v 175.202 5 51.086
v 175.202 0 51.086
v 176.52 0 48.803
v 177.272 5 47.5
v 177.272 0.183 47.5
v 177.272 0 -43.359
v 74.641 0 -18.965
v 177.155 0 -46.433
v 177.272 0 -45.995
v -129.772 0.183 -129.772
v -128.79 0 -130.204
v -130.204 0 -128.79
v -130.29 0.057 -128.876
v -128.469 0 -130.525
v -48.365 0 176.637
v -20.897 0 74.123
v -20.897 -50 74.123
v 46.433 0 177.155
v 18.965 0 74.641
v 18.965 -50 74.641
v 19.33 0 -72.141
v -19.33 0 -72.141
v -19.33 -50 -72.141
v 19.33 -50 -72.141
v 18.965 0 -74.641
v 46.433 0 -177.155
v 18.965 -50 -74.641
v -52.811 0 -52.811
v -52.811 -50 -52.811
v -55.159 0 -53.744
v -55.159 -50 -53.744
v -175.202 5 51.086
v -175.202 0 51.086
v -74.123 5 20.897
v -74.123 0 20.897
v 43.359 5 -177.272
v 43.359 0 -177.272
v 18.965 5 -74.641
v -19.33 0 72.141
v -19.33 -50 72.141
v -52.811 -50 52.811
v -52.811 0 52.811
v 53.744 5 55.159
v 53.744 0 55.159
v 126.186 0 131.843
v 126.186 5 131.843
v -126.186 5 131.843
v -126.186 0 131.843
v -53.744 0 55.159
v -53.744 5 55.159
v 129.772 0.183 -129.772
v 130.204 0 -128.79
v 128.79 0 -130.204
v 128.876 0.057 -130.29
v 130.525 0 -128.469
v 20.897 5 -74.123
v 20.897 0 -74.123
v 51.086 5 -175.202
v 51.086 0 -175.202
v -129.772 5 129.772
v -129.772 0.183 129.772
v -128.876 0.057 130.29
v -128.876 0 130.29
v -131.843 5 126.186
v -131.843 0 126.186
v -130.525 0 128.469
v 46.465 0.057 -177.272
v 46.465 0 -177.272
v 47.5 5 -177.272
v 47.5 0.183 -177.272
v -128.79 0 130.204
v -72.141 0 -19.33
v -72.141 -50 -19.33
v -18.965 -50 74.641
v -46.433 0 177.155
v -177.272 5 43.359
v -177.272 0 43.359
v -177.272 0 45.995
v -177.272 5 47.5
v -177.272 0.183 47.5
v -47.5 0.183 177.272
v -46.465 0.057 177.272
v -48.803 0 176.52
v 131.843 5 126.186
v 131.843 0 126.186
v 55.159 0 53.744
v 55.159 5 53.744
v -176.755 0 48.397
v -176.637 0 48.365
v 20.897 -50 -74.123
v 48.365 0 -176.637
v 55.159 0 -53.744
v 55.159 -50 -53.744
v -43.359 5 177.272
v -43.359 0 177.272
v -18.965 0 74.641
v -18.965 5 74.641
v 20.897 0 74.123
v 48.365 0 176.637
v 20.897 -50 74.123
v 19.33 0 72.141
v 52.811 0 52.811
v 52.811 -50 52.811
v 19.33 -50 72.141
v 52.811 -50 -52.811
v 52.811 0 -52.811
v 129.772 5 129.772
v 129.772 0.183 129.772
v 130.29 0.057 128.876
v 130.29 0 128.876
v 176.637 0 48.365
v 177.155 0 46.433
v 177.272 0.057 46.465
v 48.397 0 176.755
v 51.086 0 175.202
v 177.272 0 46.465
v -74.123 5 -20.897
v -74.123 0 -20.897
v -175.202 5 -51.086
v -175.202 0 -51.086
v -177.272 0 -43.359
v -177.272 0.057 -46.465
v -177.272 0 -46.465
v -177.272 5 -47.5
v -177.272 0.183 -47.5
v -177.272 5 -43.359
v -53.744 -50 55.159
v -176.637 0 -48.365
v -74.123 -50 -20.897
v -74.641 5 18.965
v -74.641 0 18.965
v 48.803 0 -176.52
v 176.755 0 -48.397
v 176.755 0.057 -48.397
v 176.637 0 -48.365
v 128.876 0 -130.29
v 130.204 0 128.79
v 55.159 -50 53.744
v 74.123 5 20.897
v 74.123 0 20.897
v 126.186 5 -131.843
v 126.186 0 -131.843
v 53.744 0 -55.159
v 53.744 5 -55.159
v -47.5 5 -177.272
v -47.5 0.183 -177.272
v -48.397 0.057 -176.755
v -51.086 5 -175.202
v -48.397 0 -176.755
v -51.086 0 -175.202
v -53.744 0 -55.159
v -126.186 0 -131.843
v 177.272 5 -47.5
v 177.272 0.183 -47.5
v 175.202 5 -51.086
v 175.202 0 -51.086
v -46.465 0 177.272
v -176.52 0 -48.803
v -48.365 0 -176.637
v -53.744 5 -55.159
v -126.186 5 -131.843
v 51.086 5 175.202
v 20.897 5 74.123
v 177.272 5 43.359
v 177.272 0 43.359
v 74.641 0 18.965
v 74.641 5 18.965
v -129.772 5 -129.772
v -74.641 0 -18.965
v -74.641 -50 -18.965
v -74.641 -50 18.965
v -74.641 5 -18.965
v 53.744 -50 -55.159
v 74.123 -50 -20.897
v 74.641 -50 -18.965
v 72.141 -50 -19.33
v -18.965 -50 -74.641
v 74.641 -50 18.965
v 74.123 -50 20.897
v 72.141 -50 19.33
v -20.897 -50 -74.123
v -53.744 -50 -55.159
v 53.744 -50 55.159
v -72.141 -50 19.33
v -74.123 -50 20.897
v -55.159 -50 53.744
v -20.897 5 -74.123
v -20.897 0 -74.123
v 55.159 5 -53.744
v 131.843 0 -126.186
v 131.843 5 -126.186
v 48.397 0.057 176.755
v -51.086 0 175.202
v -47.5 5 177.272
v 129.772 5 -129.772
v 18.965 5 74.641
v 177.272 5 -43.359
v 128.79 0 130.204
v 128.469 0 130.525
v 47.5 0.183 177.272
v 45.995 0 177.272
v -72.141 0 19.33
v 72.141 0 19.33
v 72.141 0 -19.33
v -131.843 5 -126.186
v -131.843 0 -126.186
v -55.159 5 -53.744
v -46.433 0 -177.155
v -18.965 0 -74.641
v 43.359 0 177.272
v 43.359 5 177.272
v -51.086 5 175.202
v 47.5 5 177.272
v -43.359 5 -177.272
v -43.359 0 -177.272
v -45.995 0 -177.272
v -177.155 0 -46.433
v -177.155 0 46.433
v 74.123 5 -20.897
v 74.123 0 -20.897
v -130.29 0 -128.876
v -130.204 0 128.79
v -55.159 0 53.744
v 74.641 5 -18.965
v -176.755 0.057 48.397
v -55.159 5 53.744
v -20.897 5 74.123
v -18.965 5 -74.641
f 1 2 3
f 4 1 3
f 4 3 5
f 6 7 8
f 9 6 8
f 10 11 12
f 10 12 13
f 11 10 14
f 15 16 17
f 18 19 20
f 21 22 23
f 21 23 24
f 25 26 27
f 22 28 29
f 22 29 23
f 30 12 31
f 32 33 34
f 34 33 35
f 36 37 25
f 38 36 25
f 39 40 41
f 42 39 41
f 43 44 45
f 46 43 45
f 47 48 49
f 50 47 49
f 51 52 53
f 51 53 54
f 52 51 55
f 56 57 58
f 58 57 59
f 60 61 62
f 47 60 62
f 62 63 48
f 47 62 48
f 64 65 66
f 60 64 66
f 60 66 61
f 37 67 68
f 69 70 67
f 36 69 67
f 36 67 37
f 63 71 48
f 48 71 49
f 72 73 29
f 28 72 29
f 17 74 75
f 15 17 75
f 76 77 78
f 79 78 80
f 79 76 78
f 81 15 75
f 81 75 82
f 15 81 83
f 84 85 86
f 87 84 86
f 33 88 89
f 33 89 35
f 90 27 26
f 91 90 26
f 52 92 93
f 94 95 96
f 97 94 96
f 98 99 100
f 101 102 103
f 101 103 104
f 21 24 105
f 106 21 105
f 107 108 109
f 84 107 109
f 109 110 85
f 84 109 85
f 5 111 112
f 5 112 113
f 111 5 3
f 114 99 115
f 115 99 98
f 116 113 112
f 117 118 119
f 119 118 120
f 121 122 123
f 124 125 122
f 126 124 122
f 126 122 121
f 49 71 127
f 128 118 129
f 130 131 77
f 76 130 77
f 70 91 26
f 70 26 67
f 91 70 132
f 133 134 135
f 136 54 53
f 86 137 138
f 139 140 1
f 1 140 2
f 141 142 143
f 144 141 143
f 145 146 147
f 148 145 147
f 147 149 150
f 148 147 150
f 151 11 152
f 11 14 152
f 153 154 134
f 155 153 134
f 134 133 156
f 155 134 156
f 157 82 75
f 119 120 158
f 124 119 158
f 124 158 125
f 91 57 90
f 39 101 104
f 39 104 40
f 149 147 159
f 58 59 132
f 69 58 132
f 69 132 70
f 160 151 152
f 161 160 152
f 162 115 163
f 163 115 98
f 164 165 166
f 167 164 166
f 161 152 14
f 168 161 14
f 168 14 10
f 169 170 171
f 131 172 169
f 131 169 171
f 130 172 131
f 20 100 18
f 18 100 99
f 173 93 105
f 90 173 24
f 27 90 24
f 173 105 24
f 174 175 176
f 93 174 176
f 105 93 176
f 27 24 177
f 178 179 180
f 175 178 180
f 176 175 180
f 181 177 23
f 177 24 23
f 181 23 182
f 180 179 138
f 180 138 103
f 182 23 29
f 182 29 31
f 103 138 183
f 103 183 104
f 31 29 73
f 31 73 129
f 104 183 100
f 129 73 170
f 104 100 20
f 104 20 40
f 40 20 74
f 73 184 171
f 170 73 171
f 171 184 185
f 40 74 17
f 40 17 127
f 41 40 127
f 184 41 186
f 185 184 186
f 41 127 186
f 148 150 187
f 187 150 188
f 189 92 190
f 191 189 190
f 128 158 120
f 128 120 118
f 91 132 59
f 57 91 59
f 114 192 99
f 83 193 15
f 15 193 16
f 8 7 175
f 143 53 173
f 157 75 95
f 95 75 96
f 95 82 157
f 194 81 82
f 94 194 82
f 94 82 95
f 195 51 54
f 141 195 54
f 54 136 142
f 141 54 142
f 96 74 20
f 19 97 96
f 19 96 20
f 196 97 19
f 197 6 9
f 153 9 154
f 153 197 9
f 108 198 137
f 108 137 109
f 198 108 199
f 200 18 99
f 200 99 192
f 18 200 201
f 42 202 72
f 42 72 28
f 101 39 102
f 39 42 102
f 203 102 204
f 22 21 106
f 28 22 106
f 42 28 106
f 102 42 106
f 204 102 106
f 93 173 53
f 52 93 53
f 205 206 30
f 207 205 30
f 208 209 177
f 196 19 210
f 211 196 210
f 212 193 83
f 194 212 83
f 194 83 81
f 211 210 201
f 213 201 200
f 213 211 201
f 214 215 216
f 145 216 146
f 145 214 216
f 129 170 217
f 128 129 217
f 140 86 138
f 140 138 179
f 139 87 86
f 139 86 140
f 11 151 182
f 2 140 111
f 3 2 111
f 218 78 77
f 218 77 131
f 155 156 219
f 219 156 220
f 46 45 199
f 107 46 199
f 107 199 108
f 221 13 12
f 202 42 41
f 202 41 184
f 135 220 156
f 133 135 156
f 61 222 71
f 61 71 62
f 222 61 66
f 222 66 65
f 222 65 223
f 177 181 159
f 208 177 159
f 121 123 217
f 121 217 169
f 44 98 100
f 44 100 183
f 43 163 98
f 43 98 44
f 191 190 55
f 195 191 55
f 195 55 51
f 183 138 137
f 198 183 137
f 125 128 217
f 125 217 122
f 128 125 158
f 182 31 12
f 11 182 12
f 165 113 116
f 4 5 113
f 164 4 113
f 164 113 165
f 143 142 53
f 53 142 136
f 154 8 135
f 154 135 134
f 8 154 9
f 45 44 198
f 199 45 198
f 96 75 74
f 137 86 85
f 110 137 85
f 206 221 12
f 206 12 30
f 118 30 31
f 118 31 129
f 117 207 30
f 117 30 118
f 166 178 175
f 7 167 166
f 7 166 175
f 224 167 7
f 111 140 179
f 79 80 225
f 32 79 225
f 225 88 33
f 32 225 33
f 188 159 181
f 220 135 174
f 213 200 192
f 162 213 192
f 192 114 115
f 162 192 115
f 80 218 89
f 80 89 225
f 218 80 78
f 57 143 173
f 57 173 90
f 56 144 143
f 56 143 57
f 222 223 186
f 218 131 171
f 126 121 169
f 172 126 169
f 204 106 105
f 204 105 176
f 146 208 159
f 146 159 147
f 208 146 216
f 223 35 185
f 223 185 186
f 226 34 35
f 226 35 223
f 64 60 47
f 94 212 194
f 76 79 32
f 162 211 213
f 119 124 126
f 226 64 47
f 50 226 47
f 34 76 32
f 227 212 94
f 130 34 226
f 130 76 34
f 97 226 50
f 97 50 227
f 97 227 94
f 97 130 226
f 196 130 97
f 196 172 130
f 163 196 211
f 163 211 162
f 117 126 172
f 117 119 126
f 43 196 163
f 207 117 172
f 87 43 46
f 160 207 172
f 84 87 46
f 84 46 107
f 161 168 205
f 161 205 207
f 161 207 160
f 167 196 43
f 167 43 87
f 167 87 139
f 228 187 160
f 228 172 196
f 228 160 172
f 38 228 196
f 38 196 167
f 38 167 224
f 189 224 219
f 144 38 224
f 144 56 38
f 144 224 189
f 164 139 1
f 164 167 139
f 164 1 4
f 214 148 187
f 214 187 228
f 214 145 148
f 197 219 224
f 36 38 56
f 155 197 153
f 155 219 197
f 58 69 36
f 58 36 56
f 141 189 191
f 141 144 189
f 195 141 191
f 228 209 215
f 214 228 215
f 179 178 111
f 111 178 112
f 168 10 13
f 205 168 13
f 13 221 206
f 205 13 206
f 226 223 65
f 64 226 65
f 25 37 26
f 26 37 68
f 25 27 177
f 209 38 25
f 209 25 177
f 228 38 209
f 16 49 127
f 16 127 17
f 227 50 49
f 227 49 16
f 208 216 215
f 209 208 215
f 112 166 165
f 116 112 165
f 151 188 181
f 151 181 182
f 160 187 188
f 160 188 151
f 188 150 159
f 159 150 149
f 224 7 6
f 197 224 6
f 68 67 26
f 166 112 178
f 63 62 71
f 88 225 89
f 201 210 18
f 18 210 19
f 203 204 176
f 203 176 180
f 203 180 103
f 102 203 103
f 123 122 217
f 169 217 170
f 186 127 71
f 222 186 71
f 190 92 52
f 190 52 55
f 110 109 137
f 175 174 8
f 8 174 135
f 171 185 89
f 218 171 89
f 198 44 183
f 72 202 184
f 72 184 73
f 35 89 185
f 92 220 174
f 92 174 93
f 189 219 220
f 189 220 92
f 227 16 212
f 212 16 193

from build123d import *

# Parameters (mm, degrees)
BOSS_EXTRUDE1_DEPTH = 5
BOSS_EXTRUDE2_DEPTH = 50
CUT_EXTRUDE2_REACH  = 258.619
CIRPATTERN1_COUNT   = 12


with BuildPart() as part:
    # Sketch1 → Boss-Extrude1 (new body)
    with BuildSketch(Plane(origin=(0, 0, 0), x_dir=(1, 0, 0), z_dir=(0, 1, 0))):
        Polygon((-51.086301889, 175.201860999), (-20.896575472, 74.123378061), (-53.744440679, 55.158654242), (-126.186111471, 131.84296572), (-129.77241336, 129.77241336), (-131.84296572, 126.186111471), (-55.158654242, 53.744440679), (-74.123378061, 20.896575472), (-175.201860999, 51.086301889), (-177.27241336, 47.5), (-177.27241336, 43.358895278), (-74.641016151, 18.96472382), (-74.641016151, -18.96472382), (-177.27241336, -43.358895278), (-177.27241336, -47.5), (-175.201860999, -51.086301889), (-74.123378061, -20.896575472), (-55.158654242, -53.744440679), (-131.84296572, -126.186111471), (-129.77241336, -129.77241336), (-126.186111471, -131.84296572), (-53.744440679, -55.158654242), (-20.896575472, -74.123378061), (-51.086301889, -175.201860999), (-47.5, -177.27241336), (-43.358895278, -177.27241336), (-18.96472382, -74.641016151), (18.96472382, -74.641016151), (43.358895278, -177.27241336), (47.5, -177.27241336), (51.086301889, -175.201860999), (20.896575472, -74.123378061), (53.744440679, -55.158654242), (126.186111471, -131.84296572), (129.77241336, -129.77241336), (131.84296572, -126.186111471), (55.158654242, -53.744440679), (74.123378061, -20.896575472), (175.201860999, -51.086301889), (177.27241336, -47.5), (177.27241336, -43.358895278), (74.641016151, -18.96472382), (74.641016151, 18.96472382), (177.27241336, 43.358895278), (177.27241336, 47.5), (175.201860999, 51.086301889), (74.123378061, 20.896575472), (55.158654242, 53.744440679), (131.84296572, 126.186111471), (129.77241336, 129.77241336), (126.186111471, 131.84296572), (53.744440679, 55.158654242), (20.896575472, 74.123378061), (51.086301889, 175.201860999), (47.5, 177.27241336), (43.358895278, 177.27241336), (18.96472382, 74.641016151), (-18.96472382, 74.641016151), (-43.358895278, 177.27241336), (-47.5, 177.27241336), align=None)
    extrude(amount=BOSS_EXTRUDE1_DEPTH)

    # Sketch2 → Boss-Extrude2 (add)
    with BuildSketch(Plane.XZ):
        Polygon((-20.896575472, 74.123378061), (-48.396575472, 176.754775269), (-47.5, 177.27241336), (-46.46472382, 177.27241336), (-18.96472382, 74.641016151), (18.96472382, 74.641016151), (46.46472382, 177.27241336), (47.5, 177.27241336), (48.396575472, 176.754775269), (20.896575472, 74.123378061), (53.744440679, 55.158654242), (128.875837887, 130.29005145), (129.77241336, 129.77241336), (130.29005145, 128.875837887), (55.158654242, 53.744440679), (74.123378061, 20.896575472), (176.754775269, 48.396575472), (177.27241336, 47.5), (177.27241336, 46.46472382), (74.641016151, 18.96472382), (74.641016151, -18.96472382), (177.27241336, -46.46472382), (177.27241336, -47.5), (176.754775269, -48.396575472), (74.123378061, -20.896575472), (55.158654242, -53.744440679), (130.29005145, -128.875837887), (129.77241336, -129.77241336), (128.875837887, -130.29005145), (53.744440679, -55.158654242), (20.896575472, -74.123378061), (48.396575472, -176.754775269), (47.5, -177.27241336), (46.46472382, -177.27241336), (18.96472382, -74.641016151), (-18.96472382, -74.641016151), (-46.46472382, -177.27241336), (-47.5, -177.27241336), (-48.396575472, -176.754775269), (-20.896575472, -74.123378061), (-53.744440679, -55.158654242), (-128.875837887, -130.29005145), (-129.77241336, -129.77241336), (-130.29005145, -128.875837887), (-55.158654242, -53.744440679), (-74.123378061, -20.896575472), (-176.754775269, -48.396575472), (-177.27241336, -47.5), (-177.27241336, -46.46472382), (-74.641016151, -18.96472382), (-74.641016151, 18.96472382), (-177.27241336, 46.46472382), (-177.27241336, 47.5), (-176.754775269, 48.396575472), (-74.123378061, 20.896575472), (-55.158654242, 53.744440679), (-130.29005145, 128.875837887), (-129.77241336, 129.77241336), (-128.875837887, 130.29005145), (-53.744440679, 55.158654242), align=None)
        Polygon((-19.330127019, 72.141016151), (-52.810889132, 52.810889132), (-72.141016151, 19.330127019), (-72.141016151, -19.330127019), (-52.810889132, -52.810889132), (-19.330127019, -72.141016151), (19.330127019, -72.141016151), (52.810889132, -52.810889132), (72.141016151, -19.330127019), (72.141016151, 19.330127019), (52.810889132, 52.810889132), (19.330127019, 72.141016151), align=None, mode=Mode.SUBTRACT)
    extrude(amount=BOSS_EXTRUDE2_DEPTH)

    # Sketch4 → Cut-Extrude2 (cut, up to next)
    with BuildSketch(Plane(origin=(0.7071067811855712, 0, 0.7071067811855722), x_dir=(0.7071067811865479, 0, -0.7071067811865471), z_dir=(0.7071067811865471, 0, 0.7071067811865479)), mode=Mode.PRIVATE) as cut_extrude2_sk1:
        Polygon((-77.006116911, -50), (-183.136497491, 0), (-183.257957802, 0), (-183.257957802, -50), align=None)
    cut_extrude2_tool1 = extrude(cut_extrude2_sk1.sketch, amount=-CUT_EXTRUDE2_REACH, mode=Mode.PRIVATE) & part.part
    # Sketch4 → Cut-Extrude2 (cut, up to next)
    with BuildSketch(Plane(origin=(0.7071067811855712, 0, 0.7071067811855722), x_dir=(0.7071067811865479, 0, -0.7071067811865471), z_dir=(0.7071067811865471, 0, 0.7071067811865479)), mode=Mode.PRIVATE) as cut_extrude2_sk2:
        Polygon((-183.136497491, 0), (-185.006116911, 0.880812549), (-185.006116911, -50), (-183.257957802, -50), (-183.257957802, 0), align=None)
    cut_extrude2_tool2 = extrude(cut_extrude2_sk2.sketch, amount=-CUT_EXTRUDE2_REACH, mode=Mode.PRIVATE) & part.part
    cut_extrude2_1 = cut_extrude2_tool1.solids().sort_by_distance((-103.832006, -33.314303, 105.24622))[0]
    add(cut_extrude2_1, mode=Mode.SUBTRACT)
    cut_extrude2_2 = cut_extrude2_tool2.solids().sort_by_distance((-129.495561, -24.763955, 130.909775))[0]
    add(cut_extrude2_2, mode=Mode.SUBTRACT)
    cut_extrude2 = cut_extrude2_1 + cut_extrude2_2  # Cut-Extrude2 as one shape, for the pattern or mirror that repeats it

    # CirPattern1: Cut-Extrude2 ×12 about axis
    cirpattern1_axis = Axis((0, 0, 0), (0, 1, 0))
    for i in range(1, CIRPATTERN1_COUNT):
        add(cut_extrude2.rotate(cirpattern1_axis, i * 360 / CIRPATTERN1_COUNT), mode=Mode.SUBTRACT)


solid = part.part
